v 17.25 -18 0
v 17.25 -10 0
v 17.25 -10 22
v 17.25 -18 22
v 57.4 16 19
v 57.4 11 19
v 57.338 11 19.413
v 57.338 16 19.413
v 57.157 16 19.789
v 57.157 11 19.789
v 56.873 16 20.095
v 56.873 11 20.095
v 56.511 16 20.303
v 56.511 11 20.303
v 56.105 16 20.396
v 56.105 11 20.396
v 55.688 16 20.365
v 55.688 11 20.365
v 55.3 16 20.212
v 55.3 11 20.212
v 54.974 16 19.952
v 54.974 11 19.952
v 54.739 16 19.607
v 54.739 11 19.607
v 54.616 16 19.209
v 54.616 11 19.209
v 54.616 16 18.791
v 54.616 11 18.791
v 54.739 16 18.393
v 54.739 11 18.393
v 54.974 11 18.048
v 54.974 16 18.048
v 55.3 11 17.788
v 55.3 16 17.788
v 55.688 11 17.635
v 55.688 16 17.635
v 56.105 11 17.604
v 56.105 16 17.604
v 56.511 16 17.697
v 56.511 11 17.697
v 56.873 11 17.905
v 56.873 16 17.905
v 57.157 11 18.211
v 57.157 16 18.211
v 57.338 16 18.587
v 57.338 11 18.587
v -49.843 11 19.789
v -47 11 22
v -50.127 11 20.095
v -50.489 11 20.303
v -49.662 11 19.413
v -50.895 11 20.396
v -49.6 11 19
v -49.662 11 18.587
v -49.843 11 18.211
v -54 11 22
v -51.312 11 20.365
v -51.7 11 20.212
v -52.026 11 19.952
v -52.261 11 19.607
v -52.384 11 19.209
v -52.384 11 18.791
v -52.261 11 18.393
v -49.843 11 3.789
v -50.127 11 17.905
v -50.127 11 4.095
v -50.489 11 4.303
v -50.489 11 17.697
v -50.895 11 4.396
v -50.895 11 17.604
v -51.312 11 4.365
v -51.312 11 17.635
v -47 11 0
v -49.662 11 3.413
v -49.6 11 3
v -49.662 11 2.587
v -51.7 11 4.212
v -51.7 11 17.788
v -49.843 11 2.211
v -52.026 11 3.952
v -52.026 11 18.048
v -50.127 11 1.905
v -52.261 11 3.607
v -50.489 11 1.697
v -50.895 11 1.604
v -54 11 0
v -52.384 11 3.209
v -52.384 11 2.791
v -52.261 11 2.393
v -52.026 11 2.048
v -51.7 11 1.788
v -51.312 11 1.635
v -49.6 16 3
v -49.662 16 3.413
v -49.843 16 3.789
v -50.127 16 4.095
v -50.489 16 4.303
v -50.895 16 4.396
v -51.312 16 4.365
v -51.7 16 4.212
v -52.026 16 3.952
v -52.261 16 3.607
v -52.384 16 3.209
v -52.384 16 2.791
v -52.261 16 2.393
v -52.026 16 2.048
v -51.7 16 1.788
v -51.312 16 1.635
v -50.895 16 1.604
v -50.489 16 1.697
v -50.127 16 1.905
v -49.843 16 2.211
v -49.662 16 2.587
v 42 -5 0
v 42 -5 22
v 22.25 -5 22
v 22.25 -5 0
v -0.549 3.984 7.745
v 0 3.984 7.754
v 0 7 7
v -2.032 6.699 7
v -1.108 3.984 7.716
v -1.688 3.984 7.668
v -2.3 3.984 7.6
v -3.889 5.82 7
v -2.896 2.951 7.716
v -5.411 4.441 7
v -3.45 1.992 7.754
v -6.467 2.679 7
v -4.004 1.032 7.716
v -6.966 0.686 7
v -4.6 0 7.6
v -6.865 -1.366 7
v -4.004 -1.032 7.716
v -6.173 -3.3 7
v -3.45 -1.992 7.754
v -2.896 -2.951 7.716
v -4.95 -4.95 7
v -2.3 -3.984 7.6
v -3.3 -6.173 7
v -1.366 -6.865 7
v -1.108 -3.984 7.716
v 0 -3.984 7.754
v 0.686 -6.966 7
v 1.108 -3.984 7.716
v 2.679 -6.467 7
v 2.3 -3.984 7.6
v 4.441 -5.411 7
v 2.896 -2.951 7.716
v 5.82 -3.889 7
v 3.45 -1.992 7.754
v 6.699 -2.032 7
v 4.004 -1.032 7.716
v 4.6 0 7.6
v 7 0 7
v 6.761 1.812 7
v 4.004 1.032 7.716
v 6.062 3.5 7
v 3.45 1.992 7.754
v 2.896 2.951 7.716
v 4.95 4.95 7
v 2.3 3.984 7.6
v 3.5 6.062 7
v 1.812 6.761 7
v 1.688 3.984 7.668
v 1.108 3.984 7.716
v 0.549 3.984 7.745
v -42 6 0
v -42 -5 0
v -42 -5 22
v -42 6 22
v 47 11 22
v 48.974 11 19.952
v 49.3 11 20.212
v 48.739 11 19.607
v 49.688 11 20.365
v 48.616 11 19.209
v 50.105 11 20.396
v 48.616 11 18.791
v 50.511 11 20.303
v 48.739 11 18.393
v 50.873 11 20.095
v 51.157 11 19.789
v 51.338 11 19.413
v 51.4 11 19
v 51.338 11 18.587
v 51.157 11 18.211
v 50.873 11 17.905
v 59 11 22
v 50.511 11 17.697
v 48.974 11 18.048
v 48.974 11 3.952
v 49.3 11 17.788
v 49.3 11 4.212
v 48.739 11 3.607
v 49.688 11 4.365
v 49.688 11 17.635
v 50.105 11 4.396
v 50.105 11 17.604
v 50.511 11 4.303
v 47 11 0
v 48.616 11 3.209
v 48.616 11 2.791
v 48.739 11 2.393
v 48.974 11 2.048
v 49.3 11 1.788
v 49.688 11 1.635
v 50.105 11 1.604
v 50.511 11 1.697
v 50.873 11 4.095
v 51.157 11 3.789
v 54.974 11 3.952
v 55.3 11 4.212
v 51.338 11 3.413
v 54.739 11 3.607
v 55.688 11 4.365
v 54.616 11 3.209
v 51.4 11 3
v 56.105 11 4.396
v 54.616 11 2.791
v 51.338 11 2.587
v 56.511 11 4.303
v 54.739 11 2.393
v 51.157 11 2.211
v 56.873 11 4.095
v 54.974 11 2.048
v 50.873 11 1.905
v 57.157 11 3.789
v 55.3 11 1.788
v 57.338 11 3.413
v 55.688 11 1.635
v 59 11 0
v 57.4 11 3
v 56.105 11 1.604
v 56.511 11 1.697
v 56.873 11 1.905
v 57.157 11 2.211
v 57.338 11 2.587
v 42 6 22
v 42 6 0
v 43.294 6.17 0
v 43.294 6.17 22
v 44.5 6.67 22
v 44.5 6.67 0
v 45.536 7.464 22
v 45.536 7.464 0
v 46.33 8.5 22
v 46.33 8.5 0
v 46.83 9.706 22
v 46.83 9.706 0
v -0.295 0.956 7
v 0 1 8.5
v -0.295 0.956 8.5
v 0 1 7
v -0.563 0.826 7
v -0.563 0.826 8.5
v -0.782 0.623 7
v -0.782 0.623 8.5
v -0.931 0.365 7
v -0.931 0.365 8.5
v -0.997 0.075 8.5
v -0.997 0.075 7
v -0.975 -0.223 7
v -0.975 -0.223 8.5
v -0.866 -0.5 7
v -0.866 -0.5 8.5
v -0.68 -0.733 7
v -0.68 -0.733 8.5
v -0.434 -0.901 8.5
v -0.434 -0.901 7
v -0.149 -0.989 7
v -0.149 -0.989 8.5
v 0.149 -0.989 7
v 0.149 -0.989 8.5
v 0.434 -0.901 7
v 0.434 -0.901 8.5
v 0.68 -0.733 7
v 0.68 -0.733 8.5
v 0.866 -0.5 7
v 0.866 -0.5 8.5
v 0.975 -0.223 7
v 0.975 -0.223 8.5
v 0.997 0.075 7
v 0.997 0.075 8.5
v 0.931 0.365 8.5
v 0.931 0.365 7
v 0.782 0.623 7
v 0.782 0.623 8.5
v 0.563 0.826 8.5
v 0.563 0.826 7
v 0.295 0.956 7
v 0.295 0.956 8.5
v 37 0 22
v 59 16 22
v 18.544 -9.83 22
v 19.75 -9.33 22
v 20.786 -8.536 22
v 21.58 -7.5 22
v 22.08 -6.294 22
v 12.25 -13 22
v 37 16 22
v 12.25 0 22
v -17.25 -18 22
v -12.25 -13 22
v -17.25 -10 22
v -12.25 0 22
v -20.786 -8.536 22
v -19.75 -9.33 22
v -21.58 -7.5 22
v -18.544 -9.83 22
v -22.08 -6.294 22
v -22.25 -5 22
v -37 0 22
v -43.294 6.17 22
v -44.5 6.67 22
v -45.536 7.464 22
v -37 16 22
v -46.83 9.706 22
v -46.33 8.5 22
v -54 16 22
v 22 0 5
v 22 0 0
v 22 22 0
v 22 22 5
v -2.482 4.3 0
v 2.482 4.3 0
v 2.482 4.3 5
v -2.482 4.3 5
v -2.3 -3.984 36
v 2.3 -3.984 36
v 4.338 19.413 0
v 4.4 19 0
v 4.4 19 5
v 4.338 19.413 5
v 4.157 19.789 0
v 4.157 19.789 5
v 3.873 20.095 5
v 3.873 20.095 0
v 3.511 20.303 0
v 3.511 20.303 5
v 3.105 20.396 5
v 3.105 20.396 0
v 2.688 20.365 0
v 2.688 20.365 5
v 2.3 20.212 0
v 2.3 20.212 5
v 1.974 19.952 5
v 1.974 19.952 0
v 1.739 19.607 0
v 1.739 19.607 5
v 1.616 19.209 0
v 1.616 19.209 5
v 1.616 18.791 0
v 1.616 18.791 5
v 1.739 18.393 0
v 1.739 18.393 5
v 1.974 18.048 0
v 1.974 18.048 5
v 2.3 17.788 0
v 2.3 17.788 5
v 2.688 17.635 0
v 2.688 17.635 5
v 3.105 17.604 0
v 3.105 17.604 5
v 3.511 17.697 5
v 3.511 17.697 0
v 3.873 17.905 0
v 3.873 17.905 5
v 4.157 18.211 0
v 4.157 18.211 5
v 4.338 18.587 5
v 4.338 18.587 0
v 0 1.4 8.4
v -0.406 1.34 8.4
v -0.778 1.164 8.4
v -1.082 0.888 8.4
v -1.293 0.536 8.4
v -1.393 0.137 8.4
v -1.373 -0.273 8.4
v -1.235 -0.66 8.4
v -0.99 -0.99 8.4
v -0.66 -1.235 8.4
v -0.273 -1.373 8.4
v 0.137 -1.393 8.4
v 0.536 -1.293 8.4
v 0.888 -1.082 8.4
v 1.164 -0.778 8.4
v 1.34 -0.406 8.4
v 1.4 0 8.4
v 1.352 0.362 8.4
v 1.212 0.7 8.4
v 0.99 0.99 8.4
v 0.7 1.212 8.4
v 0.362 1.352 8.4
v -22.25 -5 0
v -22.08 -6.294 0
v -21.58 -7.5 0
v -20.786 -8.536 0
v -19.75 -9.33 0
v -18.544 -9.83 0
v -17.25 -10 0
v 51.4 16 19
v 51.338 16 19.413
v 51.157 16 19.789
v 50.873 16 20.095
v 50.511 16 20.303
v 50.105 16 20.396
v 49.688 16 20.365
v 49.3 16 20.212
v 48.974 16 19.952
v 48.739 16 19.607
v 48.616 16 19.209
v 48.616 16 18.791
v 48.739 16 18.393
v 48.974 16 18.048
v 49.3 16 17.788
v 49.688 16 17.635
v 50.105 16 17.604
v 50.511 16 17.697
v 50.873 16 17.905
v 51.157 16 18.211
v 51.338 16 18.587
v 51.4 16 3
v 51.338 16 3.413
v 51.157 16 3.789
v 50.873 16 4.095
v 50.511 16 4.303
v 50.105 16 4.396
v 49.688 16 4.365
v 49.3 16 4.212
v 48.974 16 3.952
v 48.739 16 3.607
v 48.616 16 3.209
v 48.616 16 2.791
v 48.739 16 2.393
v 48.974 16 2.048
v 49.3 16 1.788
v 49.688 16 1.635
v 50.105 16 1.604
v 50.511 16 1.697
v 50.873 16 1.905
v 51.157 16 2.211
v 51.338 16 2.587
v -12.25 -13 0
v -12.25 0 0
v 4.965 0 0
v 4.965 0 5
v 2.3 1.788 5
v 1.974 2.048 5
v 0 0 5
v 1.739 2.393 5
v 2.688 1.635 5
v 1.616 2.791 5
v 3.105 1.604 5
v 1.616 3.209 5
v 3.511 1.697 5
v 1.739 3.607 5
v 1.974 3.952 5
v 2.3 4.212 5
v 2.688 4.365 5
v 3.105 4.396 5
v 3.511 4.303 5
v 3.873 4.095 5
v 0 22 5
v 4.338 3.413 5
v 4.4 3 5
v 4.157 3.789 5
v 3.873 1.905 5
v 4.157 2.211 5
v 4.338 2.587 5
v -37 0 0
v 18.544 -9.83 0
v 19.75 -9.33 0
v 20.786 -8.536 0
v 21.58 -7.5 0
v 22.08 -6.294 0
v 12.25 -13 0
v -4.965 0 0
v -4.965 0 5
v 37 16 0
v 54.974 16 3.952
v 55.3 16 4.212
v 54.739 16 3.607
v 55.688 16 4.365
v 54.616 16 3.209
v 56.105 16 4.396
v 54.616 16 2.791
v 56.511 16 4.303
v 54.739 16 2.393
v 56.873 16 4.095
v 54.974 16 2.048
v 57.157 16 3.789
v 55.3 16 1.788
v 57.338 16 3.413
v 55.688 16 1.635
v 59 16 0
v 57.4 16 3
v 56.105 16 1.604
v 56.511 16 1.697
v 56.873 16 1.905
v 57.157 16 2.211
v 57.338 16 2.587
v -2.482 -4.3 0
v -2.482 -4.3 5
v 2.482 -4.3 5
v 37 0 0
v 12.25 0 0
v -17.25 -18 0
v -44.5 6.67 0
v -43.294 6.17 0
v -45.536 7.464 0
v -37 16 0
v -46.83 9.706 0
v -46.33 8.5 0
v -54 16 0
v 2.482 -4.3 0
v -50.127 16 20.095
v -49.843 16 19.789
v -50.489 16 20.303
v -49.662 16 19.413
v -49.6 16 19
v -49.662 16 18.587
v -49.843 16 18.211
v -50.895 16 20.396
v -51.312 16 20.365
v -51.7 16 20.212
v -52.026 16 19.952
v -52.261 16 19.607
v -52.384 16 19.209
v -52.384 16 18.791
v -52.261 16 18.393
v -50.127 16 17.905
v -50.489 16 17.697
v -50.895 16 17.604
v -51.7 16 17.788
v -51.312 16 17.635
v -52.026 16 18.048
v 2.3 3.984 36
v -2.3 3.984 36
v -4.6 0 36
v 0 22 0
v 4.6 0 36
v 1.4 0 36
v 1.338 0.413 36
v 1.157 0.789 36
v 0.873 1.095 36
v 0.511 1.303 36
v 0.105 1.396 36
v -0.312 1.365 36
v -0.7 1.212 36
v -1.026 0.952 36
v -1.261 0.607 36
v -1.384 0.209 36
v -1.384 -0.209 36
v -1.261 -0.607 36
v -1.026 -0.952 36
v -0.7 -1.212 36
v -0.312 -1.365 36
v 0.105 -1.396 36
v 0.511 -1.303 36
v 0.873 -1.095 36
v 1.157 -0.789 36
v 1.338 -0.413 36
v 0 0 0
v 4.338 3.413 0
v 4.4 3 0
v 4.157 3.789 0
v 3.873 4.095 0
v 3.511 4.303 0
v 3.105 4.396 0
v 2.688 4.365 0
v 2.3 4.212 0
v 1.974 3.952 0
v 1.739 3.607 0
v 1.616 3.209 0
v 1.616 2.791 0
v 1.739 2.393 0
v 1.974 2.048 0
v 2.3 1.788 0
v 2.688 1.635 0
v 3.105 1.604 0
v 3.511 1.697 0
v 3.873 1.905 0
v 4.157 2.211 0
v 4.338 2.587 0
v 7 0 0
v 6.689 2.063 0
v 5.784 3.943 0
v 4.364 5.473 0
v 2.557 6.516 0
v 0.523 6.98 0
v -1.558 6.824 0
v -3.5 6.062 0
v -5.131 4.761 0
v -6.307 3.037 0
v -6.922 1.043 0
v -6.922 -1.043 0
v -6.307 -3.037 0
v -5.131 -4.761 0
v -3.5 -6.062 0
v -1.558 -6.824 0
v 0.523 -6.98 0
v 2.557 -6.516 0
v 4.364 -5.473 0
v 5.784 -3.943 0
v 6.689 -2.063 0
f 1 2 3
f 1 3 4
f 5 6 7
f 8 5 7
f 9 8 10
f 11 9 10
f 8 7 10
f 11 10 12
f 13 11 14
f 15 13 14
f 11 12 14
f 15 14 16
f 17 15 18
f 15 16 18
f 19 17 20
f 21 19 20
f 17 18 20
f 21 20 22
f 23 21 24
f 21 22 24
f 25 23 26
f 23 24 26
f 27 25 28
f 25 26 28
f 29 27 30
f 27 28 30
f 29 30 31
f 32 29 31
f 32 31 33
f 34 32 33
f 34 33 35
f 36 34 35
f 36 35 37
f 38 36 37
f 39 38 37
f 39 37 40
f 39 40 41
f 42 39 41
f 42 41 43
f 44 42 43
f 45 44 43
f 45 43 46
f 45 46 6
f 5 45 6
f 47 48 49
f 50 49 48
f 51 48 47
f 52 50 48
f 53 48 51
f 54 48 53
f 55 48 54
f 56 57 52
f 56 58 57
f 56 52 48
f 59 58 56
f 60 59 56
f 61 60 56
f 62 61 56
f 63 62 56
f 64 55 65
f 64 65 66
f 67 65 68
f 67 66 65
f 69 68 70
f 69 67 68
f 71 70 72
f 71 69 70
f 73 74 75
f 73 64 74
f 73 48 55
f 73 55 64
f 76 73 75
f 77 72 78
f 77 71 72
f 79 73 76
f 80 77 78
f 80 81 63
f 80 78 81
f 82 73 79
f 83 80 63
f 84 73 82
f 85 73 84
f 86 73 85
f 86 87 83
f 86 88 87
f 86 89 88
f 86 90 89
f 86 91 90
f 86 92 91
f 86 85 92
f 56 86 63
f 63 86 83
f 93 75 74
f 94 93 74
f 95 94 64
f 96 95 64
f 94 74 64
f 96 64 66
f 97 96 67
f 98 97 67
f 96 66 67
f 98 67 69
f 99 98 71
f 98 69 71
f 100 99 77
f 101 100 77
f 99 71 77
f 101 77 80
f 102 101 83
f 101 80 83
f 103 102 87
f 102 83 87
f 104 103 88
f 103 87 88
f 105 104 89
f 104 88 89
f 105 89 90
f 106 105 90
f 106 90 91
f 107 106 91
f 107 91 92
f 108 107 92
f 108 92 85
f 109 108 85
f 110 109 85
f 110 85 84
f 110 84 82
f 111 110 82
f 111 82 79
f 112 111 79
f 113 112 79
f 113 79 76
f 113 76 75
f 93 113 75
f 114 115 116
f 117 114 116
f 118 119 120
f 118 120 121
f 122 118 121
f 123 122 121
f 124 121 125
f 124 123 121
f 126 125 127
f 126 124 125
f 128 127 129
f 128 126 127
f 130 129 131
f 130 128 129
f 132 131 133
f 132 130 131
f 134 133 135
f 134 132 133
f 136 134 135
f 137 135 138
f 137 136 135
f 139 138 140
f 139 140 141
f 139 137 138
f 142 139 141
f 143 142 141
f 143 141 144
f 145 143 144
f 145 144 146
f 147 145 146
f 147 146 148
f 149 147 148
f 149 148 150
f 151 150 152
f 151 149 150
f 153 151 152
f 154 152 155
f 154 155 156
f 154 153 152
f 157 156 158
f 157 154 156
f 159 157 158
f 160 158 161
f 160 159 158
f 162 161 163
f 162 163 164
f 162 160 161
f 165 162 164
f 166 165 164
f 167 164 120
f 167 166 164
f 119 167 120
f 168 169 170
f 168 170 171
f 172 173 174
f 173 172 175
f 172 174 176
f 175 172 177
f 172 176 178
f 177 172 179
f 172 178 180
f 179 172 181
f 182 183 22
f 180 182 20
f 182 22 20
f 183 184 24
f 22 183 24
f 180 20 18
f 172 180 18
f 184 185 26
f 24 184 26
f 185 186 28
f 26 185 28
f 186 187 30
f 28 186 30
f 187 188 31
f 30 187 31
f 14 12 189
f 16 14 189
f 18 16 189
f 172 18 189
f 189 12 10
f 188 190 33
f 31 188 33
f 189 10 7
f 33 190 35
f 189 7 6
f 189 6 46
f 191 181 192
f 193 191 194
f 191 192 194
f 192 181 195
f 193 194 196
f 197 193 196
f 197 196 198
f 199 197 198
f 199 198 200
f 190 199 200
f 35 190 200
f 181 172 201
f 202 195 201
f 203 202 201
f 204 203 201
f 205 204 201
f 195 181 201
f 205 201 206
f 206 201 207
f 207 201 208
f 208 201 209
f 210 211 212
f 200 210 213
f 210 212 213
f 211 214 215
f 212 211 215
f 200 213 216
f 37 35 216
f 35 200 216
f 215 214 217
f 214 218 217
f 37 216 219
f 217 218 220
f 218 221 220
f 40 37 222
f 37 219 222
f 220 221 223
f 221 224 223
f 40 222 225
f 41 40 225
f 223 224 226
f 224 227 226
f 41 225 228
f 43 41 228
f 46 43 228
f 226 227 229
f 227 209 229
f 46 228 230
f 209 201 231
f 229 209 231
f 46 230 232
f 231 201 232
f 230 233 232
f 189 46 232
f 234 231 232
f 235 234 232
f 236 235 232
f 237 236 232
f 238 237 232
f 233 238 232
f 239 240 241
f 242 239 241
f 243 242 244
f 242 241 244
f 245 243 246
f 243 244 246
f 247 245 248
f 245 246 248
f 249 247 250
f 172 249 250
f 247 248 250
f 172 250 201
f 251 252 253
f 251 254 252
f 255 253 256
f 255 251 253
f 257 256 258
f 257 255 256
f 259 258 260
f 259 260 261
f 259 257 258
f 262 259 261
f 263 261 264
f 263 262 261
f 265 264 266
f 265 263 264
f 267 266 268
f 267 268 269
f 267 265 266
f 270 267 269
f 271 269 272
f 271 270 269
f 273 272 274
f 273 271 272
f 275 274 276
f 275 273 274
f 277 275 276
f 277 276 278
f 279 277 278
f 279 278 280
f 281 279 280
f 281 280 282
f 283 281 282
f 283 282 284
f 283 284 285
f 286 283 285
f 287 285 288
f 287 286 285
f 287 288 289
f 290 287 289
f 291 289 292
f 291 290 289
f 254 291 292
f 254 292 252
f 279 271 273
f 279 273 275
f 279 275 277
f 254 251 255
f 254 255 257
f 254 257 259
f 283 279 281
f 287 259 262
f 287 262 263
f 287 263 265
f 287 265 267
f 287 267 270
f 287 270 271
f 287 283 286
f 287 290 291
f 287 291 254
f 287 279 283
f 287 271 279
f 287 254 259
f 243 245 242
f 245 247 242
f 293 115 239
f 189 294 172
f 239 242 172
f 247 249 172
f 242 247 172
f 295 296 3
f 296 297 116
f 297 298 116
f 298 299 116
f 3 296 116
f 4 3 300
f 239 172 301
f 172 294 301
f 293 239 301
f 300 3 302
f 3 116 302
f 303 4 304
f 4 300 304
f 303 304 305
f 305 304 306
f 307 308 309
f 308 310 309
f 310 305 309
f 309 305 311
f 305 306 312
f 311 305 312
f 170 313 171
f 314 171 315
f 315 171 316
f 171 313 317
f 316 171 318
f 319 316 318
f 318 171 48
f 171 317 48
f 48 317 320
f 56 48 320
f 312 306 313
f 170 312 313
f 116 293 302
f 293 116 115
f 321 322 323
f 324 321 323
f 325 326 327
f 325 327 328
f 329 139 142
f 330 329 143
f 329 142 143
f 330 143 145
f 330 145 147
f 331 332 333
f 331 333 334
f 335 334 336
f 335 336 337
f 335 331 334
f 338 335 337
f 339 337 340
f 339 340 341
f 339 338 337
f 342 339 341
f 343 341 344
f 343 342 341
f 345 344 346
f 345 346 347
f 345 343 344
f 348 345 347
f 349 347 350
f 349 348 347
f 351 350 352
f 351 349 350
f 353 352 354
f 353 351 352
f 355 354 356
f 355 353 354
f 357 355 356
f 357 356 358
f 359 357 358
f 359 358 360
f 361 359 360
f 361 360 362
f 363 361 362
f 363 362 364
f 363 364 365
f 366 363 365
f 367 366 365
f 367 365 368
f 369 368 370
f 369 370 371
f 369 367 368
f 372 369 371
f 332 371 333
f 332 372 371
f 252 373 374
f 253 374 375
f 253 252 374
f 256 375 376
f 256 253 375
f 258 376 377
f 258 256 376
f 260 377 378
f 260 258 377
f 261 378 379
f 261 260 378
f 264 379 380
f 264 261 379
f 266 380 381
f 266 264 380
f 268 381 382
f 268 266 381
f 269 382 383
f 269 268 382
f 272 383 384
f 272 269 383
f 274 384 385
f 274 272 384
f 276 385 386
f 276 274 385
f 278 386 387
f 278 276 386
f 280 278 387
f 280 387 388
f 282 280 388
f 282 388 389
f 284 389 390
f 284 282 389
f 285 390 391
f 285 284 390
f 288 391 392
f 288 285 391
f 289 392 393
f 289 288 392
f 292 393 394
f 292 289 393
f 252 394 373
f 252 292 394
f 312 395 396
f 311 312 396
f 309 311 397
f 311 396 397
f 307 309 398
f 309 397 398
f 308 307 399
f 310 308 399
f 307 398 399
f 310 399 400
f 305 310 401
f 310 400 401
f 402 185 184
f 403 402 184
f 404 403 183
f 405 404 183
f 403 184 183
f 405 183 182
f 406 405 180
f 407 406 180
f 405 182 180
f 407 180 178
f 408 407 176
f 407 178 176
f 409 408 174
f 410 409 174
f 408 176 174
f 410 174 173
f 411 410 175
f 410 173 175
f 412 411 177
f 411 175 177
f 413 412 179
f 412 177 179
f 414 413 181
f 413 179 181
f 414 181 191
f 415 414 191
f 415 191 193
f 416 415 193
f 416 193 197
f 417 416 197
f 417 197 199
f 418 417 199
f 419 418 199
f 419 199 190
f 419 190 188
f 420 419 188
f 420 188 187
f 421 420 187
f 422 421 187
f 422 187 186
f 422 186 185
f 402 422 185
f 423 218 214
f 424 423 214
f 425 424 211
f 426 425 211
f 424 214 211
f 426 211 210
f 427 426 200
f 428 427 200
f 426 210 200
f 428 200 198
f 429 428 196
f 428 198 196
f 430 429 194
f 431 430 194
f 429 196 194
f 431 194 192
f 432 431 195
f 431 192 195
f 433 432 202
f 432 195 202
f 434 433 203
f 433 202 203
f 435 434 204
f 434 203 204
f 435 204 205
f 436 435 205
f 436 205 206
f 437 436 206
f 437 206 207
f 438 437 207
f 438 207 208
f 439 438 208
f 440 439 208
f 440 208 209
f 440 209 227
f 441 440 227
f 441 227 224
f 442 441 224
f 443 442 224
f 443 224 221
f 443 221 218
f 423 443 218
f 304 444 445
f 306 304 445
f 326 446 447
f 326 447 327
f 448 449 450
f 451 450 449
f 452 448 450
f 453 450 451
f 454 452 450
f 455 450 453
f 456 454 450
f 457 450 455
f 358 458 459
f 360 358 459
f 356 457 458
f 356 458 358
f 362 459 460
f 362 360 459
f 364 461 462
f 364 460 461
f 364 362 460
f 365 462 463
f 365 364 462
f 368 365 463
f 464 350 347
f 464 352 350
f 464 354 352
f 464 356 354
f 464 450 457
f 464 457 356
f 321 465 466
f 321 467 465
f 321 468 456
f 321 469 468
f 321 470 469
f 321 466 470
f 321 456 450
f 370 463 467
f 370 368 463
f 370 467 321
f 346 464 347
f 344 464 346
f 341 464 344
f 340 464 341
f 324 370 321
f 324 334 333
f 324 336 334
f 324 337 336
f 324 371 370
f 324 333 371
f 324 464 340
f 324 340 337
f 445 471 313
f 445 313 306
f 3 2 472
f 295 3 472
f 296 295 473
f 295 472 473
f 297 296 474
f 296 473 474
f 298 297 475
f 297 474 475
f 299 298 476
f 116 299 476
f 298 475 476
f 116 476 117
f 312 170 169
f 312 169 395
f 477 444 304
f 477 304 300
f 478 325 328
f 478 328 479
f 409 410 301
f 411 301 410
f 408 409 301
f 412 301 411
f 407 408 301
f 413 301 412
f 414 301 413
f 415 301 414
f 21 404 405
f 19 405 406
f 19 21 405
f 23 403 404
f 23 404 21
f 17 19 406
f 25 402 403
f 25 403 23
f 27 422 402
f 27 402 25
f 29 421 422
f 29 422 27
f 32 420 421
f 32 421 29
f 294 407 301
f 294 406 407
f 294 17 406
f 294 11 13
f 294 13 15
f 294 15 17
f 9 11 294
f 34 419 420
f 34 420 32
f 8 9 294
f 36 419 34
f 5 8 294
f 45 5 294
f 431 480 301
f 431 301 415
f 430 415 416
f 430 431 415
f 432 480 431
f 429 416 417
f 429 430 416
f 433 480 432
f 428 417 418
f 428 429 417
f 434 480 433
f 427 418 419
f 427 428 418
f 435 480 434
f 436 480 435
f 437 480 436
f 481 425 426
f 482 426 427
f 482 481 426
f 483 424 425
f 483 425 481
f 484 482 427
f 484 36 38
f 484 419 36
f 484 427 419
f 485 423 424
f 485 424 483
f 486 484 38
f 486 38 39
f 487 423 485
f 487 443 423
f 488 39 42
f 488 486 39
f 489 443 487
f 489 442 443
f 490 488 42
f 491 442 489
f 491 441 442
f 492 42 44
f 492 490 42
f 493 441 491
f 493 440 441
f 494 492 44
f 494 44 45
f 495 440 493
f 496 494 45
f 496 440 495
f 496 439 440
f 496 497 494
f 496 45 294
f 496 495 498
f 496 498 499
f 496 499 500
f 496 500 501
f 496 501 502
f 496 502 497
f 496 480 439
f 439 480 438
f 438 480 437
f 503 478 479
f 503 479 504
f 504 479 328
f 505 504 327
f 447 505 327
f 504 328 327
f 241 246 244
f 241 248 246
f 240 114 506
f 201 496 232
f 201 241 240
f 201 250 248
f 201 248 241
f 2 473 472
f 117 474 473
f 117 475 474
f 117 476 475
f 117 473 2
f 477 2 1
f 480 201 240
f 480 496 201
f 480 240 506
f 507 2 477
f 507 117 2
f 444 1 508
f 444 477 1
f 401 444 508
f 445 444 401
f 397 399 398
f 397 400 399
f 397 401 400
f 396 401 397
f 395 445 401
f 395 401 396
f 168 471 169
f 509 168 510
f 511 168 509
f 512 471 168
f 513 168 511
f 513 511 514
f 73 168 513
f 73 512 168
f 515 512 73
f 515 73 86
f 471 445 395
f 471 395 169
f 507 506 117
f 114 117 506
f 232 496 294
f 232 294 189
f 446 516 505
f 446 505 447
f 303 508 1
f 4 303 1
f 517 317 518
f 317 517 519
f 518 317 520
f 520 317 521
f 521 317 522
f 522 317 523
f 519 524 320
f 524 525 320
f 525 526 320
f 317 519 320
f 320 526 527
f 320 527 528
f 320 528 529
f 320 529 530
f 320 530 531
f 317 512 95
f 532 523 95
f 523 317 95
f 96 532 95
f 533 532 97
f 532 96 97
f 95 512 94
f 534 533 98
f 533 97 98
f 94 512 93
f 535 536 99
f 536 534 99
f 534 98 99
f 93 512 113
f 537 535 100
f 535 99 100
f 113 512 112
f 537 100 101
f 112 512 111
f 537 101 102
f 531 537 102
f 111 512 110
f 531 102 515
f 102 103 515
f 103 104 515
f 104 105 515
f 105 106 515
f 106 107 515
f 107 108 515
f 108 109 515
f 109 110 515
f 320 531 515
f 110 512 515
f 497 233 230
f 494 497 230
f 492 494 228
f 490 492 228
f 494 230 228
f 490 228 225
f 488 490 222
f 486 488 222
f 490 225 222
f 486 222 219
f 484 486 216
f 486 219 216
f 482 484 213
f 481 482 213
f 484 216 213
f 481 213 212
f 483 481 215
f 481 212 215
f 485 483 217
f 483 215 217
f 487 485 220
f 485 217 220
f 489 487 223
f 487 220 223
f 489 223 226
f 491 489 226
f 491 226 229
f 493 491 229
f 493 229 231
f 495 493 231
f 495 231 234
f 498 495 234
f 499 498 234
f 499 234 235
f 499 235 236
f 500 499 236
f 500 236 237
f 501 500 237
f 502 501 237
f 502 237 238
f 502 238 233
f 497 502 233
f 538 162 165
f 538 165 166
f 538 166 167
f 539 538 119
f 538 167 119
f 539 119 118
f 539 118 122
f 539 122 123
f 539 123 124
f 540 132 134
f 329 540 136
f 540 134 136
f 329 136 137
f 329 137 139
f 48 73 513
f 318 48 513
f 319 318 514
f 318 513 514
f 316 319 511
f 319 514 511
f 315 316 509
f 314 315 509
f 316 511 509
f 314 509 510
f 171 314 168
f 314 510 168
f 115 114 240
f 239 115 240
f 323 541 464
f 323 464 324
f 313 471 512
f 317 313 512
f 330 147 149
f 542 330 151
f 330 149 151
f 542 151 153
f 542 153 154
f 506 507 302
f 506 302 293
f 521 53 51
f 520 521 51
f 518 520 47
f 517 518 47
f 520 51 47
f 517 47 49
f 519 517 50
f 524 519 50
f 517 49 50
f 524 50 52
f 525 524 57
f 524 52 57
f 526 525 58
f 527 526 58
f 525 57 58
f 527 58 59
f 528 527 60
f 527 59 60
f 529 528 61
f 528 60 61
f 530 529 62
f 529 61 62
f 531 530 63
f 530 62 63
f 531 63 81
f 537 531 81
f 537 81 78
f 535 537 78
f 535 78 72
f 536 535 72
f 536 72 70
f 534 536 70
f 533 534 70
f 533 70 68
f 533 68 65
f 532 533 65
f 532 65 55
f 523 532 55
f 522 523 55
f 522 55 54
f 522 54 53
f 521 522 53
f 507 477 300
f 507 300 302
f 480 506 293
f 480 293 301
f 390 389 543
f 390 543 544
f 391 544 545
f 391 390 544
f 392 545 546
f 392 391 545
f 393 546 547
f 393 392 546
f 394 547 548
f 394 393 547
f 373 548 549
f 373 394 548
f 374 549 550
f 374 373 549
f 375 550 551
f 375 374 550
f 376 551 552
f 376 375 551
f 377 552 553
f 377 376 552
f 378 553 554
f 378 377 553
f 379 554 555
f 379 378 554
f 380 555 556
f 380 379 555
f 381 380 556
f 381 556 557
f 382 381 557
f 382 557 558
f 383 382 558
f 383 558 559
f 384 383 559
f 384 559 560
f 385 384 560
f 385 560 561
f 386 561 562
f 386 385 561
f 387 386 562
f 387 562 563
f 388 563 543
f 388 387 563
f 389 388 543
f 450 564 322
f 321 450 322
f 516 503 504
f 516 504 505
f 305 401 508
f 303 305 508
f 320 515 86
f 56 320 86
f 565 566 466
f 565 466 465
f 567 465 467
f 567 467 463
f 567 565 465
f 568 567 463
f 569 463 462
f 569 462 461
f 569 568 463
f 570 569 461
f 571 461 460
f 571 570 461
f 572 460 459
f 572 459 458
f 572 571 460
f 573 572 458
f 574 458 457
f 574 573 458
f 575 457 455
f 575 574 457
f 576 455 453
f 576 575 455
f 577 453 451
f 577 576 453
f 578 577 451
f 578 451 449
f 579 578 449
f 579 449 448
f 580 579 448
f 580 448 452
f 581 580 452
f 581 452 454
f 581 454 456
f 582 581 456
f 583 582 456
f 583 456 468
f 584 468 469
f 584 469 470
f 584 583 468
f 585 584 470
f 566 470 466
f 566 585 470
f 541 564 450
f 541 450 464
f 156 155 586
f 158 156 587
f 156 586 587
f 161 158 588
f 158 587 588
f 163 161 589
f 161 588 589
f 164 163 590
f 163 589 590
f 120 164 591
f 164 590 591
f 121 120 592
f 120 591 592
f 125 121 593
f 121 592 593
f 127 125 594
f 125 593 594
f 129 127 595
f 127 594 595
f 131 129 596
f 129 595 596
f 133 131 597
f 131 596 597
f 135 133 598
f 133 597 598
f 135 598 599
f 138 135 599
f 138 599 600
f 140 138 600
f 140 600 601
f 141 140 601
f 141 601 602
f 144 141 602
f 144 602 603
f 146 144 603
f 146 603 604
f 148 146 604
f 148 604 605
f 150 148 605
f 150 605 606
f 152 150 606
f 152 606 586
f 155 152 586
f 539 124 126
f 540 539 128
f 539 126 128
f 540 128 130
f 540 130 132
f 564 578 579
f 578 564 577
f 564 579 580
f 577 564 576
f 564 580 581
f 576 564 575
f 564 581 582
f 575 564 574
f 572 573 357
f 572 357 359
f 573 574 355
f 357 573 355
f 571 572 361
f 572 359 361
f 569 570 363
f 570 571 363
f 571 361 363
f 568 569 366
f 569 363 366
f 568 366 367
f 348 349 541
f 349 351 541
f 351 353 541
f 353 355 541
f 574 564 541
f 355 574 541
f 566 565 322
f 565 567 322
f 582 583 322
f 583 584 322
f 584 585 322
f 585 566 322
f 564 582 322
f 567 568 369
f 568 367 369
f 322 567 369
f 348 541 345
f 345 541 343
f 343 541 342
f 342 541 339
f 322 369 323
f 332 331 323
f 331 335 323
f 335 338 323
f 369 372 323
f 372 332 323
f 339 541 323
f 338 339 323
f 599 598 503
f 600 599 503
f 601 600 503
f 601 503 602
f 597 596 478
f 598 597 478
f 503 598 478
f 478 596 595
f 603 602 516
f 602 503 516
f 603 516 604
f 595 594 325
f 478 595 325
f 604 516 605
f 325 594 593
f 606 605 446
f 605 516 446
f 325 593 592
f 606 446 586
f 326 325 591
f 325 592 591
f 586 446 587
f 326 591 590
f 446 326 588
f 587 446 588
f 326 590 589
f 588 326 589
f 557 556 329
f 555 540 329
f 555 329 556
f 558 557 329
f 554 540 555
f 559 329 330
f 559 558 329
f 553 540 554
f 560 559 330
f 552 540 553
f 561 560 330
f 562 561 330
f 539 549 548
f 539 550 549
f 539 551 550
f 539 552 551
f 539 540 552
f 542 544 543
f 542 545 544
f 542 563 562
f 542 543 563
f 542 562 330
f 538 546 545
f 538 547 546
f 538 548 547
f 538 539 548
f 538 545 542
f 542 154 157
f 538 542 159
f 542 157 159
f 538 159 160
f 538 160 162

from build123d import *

# Parameters (mm, degrees)
SKETCH_R        = 7
PAD_DEPTH       = 7
SKETCH001_R     = 1.4
PAD001_DEPTH    = 36
POCKET_DEPTH    = 5
SKETCH006_W     = 22
SKETCH006_H     = 22
SKETCH006_R     = 1.4
PAD003_DEPTH    = 5
PAD002_DEPTH    = 22
SKETCH005_R     = 1.4
POCKET001_DEPTH = 16.001


with BuildPart() as body:
    # Sketch → Pad (new body)
    with BuildSketch(Plane.XY):
        Circle(SKETCH_R)
    extrude(amount=PAD_DEPTH)

    # Sketch001 → Pad001 (join)
    with BuildSketch(Plane.XY):
        Polygon((4.6, 0), (2.3, 3.983717), (-2.3, 3.983717), (-4.6, 0), (-2.3, -3.983717), (2.3, -3.983717), align=None)
        Circle(SKETCH001_R, mode=Mode.SUBTRACT)
    extrude(amount=PAD001_DEPTH)

    # Sketch002 → Pocket (cut)
    with BuildSketch(Plane.XY):
        Polygon((4.965, 0), (2.4825, 4.299816), (-2.4825, 4.299816), (-4.965, 0), (-2.4825, -4.299816), (2.4825, -4.299816), align=None)
    extrude(amount=POCKET_DEPTH, mode=Mode.SUBTRACT)

    # Sketch003 → Revolution (revolve)
    with BuildSketch(Plane.YZ):
        Polygon((1, 8.5), (1, 7), (7, 7), align=None)
    revolve(axis=Axis((0, 0, 0), (0, 0, 1)))


with BuildPart() as body001rearsecure:
    # Sketch006 → Pad003 (new body)
    with BuildSketch(Plane.XY):
        with Locations((11, 11)):
            Rectangle(SKETCH006_W, SKETCH006_H)
        with Locations((3, 19)):
            Circle(SKETCH006_R, mode=Mode.SUBTRACT)
        with Locations((3, 3)):
            Circle(SKETCH006_R, mode=Mode.SUBTRACT)
    extrude(amount=PAD003_DEPTH)


with BuildPart() as body002:
    # Sketch004 → Pad002 (new body)
    with BuildSketch(Plane.XY):
        with BuildLine():
            Line((-37, 0), (-12.25, 0))
            Line((-12.25, -13), (-12.25, 0))
            Line((-12.25, -13), (12.25, -13))
            Line((12.25, -13), (12.25, 0))
            Line((12.25, 0), (37, 0))
            Line((37, 0), (37, 16))
            Line((37, 16), (59, 16))
            Line((59, 16), (59, 11))
            Line((47, 11), (59, 11))
            ThreePointArc((42, 6), (45.535534, 7.464466), (47, 11))
            Line((42, -5), (42, 6))
            Line((42, -5), (22.25, -5))
            ThreePointArc((17.25, -10), (20.785534, -8.535534), (22.25, -5))
            Line((17.25, -10), (17.25, -18))
            Line((-17.25, -18), (17.25, -18))
            Line((-17.25, -10), (-17.25, -18))
            ThreePointArc((-22.25, -5), (-20.785534, -8.535534), (-17.25, -10))
            Line((-42, -5), (-22.25, -5))
            Line((-42, -5), (-42, 6))
            ThreePointArc((-47, 11), (-45.535534, 7.464466), (-42, 6))
            Line((-47, 11), (-54, 11))
            Line((-54, 16), (-54, 11))
            Line((-37, 16), (-54, 16))
            Line((-37, 0), (-37, 16))
        make_face()
    extrude(amount=PAD002_DEPTH)

    # Sketch005 → Pocket001 (cut, through all)
    with BuildSketch(Plane.XZ):
        with Locations((-51, 19)):
            Circle(SKETCH005_R)
        with Locations((-51, 3)):
            Circle(SKETCH005_R)
        with Locations((56, 19)):
            Circle(SKETCH005_R)
        with Locations((56, 3)):
            Circle(SKETCH005_R)
        with Locations((50, 19)):
            Circle(SKETCH005_R)
        with Locations((50, 3)):
            Circle(SKETCH005_R)
    extrude(amount=-POCKET001_DEPTH, mode=Mode.SUBTRACT)


solid = Compound([body.part, body001rearsecure.part, body002.part])
